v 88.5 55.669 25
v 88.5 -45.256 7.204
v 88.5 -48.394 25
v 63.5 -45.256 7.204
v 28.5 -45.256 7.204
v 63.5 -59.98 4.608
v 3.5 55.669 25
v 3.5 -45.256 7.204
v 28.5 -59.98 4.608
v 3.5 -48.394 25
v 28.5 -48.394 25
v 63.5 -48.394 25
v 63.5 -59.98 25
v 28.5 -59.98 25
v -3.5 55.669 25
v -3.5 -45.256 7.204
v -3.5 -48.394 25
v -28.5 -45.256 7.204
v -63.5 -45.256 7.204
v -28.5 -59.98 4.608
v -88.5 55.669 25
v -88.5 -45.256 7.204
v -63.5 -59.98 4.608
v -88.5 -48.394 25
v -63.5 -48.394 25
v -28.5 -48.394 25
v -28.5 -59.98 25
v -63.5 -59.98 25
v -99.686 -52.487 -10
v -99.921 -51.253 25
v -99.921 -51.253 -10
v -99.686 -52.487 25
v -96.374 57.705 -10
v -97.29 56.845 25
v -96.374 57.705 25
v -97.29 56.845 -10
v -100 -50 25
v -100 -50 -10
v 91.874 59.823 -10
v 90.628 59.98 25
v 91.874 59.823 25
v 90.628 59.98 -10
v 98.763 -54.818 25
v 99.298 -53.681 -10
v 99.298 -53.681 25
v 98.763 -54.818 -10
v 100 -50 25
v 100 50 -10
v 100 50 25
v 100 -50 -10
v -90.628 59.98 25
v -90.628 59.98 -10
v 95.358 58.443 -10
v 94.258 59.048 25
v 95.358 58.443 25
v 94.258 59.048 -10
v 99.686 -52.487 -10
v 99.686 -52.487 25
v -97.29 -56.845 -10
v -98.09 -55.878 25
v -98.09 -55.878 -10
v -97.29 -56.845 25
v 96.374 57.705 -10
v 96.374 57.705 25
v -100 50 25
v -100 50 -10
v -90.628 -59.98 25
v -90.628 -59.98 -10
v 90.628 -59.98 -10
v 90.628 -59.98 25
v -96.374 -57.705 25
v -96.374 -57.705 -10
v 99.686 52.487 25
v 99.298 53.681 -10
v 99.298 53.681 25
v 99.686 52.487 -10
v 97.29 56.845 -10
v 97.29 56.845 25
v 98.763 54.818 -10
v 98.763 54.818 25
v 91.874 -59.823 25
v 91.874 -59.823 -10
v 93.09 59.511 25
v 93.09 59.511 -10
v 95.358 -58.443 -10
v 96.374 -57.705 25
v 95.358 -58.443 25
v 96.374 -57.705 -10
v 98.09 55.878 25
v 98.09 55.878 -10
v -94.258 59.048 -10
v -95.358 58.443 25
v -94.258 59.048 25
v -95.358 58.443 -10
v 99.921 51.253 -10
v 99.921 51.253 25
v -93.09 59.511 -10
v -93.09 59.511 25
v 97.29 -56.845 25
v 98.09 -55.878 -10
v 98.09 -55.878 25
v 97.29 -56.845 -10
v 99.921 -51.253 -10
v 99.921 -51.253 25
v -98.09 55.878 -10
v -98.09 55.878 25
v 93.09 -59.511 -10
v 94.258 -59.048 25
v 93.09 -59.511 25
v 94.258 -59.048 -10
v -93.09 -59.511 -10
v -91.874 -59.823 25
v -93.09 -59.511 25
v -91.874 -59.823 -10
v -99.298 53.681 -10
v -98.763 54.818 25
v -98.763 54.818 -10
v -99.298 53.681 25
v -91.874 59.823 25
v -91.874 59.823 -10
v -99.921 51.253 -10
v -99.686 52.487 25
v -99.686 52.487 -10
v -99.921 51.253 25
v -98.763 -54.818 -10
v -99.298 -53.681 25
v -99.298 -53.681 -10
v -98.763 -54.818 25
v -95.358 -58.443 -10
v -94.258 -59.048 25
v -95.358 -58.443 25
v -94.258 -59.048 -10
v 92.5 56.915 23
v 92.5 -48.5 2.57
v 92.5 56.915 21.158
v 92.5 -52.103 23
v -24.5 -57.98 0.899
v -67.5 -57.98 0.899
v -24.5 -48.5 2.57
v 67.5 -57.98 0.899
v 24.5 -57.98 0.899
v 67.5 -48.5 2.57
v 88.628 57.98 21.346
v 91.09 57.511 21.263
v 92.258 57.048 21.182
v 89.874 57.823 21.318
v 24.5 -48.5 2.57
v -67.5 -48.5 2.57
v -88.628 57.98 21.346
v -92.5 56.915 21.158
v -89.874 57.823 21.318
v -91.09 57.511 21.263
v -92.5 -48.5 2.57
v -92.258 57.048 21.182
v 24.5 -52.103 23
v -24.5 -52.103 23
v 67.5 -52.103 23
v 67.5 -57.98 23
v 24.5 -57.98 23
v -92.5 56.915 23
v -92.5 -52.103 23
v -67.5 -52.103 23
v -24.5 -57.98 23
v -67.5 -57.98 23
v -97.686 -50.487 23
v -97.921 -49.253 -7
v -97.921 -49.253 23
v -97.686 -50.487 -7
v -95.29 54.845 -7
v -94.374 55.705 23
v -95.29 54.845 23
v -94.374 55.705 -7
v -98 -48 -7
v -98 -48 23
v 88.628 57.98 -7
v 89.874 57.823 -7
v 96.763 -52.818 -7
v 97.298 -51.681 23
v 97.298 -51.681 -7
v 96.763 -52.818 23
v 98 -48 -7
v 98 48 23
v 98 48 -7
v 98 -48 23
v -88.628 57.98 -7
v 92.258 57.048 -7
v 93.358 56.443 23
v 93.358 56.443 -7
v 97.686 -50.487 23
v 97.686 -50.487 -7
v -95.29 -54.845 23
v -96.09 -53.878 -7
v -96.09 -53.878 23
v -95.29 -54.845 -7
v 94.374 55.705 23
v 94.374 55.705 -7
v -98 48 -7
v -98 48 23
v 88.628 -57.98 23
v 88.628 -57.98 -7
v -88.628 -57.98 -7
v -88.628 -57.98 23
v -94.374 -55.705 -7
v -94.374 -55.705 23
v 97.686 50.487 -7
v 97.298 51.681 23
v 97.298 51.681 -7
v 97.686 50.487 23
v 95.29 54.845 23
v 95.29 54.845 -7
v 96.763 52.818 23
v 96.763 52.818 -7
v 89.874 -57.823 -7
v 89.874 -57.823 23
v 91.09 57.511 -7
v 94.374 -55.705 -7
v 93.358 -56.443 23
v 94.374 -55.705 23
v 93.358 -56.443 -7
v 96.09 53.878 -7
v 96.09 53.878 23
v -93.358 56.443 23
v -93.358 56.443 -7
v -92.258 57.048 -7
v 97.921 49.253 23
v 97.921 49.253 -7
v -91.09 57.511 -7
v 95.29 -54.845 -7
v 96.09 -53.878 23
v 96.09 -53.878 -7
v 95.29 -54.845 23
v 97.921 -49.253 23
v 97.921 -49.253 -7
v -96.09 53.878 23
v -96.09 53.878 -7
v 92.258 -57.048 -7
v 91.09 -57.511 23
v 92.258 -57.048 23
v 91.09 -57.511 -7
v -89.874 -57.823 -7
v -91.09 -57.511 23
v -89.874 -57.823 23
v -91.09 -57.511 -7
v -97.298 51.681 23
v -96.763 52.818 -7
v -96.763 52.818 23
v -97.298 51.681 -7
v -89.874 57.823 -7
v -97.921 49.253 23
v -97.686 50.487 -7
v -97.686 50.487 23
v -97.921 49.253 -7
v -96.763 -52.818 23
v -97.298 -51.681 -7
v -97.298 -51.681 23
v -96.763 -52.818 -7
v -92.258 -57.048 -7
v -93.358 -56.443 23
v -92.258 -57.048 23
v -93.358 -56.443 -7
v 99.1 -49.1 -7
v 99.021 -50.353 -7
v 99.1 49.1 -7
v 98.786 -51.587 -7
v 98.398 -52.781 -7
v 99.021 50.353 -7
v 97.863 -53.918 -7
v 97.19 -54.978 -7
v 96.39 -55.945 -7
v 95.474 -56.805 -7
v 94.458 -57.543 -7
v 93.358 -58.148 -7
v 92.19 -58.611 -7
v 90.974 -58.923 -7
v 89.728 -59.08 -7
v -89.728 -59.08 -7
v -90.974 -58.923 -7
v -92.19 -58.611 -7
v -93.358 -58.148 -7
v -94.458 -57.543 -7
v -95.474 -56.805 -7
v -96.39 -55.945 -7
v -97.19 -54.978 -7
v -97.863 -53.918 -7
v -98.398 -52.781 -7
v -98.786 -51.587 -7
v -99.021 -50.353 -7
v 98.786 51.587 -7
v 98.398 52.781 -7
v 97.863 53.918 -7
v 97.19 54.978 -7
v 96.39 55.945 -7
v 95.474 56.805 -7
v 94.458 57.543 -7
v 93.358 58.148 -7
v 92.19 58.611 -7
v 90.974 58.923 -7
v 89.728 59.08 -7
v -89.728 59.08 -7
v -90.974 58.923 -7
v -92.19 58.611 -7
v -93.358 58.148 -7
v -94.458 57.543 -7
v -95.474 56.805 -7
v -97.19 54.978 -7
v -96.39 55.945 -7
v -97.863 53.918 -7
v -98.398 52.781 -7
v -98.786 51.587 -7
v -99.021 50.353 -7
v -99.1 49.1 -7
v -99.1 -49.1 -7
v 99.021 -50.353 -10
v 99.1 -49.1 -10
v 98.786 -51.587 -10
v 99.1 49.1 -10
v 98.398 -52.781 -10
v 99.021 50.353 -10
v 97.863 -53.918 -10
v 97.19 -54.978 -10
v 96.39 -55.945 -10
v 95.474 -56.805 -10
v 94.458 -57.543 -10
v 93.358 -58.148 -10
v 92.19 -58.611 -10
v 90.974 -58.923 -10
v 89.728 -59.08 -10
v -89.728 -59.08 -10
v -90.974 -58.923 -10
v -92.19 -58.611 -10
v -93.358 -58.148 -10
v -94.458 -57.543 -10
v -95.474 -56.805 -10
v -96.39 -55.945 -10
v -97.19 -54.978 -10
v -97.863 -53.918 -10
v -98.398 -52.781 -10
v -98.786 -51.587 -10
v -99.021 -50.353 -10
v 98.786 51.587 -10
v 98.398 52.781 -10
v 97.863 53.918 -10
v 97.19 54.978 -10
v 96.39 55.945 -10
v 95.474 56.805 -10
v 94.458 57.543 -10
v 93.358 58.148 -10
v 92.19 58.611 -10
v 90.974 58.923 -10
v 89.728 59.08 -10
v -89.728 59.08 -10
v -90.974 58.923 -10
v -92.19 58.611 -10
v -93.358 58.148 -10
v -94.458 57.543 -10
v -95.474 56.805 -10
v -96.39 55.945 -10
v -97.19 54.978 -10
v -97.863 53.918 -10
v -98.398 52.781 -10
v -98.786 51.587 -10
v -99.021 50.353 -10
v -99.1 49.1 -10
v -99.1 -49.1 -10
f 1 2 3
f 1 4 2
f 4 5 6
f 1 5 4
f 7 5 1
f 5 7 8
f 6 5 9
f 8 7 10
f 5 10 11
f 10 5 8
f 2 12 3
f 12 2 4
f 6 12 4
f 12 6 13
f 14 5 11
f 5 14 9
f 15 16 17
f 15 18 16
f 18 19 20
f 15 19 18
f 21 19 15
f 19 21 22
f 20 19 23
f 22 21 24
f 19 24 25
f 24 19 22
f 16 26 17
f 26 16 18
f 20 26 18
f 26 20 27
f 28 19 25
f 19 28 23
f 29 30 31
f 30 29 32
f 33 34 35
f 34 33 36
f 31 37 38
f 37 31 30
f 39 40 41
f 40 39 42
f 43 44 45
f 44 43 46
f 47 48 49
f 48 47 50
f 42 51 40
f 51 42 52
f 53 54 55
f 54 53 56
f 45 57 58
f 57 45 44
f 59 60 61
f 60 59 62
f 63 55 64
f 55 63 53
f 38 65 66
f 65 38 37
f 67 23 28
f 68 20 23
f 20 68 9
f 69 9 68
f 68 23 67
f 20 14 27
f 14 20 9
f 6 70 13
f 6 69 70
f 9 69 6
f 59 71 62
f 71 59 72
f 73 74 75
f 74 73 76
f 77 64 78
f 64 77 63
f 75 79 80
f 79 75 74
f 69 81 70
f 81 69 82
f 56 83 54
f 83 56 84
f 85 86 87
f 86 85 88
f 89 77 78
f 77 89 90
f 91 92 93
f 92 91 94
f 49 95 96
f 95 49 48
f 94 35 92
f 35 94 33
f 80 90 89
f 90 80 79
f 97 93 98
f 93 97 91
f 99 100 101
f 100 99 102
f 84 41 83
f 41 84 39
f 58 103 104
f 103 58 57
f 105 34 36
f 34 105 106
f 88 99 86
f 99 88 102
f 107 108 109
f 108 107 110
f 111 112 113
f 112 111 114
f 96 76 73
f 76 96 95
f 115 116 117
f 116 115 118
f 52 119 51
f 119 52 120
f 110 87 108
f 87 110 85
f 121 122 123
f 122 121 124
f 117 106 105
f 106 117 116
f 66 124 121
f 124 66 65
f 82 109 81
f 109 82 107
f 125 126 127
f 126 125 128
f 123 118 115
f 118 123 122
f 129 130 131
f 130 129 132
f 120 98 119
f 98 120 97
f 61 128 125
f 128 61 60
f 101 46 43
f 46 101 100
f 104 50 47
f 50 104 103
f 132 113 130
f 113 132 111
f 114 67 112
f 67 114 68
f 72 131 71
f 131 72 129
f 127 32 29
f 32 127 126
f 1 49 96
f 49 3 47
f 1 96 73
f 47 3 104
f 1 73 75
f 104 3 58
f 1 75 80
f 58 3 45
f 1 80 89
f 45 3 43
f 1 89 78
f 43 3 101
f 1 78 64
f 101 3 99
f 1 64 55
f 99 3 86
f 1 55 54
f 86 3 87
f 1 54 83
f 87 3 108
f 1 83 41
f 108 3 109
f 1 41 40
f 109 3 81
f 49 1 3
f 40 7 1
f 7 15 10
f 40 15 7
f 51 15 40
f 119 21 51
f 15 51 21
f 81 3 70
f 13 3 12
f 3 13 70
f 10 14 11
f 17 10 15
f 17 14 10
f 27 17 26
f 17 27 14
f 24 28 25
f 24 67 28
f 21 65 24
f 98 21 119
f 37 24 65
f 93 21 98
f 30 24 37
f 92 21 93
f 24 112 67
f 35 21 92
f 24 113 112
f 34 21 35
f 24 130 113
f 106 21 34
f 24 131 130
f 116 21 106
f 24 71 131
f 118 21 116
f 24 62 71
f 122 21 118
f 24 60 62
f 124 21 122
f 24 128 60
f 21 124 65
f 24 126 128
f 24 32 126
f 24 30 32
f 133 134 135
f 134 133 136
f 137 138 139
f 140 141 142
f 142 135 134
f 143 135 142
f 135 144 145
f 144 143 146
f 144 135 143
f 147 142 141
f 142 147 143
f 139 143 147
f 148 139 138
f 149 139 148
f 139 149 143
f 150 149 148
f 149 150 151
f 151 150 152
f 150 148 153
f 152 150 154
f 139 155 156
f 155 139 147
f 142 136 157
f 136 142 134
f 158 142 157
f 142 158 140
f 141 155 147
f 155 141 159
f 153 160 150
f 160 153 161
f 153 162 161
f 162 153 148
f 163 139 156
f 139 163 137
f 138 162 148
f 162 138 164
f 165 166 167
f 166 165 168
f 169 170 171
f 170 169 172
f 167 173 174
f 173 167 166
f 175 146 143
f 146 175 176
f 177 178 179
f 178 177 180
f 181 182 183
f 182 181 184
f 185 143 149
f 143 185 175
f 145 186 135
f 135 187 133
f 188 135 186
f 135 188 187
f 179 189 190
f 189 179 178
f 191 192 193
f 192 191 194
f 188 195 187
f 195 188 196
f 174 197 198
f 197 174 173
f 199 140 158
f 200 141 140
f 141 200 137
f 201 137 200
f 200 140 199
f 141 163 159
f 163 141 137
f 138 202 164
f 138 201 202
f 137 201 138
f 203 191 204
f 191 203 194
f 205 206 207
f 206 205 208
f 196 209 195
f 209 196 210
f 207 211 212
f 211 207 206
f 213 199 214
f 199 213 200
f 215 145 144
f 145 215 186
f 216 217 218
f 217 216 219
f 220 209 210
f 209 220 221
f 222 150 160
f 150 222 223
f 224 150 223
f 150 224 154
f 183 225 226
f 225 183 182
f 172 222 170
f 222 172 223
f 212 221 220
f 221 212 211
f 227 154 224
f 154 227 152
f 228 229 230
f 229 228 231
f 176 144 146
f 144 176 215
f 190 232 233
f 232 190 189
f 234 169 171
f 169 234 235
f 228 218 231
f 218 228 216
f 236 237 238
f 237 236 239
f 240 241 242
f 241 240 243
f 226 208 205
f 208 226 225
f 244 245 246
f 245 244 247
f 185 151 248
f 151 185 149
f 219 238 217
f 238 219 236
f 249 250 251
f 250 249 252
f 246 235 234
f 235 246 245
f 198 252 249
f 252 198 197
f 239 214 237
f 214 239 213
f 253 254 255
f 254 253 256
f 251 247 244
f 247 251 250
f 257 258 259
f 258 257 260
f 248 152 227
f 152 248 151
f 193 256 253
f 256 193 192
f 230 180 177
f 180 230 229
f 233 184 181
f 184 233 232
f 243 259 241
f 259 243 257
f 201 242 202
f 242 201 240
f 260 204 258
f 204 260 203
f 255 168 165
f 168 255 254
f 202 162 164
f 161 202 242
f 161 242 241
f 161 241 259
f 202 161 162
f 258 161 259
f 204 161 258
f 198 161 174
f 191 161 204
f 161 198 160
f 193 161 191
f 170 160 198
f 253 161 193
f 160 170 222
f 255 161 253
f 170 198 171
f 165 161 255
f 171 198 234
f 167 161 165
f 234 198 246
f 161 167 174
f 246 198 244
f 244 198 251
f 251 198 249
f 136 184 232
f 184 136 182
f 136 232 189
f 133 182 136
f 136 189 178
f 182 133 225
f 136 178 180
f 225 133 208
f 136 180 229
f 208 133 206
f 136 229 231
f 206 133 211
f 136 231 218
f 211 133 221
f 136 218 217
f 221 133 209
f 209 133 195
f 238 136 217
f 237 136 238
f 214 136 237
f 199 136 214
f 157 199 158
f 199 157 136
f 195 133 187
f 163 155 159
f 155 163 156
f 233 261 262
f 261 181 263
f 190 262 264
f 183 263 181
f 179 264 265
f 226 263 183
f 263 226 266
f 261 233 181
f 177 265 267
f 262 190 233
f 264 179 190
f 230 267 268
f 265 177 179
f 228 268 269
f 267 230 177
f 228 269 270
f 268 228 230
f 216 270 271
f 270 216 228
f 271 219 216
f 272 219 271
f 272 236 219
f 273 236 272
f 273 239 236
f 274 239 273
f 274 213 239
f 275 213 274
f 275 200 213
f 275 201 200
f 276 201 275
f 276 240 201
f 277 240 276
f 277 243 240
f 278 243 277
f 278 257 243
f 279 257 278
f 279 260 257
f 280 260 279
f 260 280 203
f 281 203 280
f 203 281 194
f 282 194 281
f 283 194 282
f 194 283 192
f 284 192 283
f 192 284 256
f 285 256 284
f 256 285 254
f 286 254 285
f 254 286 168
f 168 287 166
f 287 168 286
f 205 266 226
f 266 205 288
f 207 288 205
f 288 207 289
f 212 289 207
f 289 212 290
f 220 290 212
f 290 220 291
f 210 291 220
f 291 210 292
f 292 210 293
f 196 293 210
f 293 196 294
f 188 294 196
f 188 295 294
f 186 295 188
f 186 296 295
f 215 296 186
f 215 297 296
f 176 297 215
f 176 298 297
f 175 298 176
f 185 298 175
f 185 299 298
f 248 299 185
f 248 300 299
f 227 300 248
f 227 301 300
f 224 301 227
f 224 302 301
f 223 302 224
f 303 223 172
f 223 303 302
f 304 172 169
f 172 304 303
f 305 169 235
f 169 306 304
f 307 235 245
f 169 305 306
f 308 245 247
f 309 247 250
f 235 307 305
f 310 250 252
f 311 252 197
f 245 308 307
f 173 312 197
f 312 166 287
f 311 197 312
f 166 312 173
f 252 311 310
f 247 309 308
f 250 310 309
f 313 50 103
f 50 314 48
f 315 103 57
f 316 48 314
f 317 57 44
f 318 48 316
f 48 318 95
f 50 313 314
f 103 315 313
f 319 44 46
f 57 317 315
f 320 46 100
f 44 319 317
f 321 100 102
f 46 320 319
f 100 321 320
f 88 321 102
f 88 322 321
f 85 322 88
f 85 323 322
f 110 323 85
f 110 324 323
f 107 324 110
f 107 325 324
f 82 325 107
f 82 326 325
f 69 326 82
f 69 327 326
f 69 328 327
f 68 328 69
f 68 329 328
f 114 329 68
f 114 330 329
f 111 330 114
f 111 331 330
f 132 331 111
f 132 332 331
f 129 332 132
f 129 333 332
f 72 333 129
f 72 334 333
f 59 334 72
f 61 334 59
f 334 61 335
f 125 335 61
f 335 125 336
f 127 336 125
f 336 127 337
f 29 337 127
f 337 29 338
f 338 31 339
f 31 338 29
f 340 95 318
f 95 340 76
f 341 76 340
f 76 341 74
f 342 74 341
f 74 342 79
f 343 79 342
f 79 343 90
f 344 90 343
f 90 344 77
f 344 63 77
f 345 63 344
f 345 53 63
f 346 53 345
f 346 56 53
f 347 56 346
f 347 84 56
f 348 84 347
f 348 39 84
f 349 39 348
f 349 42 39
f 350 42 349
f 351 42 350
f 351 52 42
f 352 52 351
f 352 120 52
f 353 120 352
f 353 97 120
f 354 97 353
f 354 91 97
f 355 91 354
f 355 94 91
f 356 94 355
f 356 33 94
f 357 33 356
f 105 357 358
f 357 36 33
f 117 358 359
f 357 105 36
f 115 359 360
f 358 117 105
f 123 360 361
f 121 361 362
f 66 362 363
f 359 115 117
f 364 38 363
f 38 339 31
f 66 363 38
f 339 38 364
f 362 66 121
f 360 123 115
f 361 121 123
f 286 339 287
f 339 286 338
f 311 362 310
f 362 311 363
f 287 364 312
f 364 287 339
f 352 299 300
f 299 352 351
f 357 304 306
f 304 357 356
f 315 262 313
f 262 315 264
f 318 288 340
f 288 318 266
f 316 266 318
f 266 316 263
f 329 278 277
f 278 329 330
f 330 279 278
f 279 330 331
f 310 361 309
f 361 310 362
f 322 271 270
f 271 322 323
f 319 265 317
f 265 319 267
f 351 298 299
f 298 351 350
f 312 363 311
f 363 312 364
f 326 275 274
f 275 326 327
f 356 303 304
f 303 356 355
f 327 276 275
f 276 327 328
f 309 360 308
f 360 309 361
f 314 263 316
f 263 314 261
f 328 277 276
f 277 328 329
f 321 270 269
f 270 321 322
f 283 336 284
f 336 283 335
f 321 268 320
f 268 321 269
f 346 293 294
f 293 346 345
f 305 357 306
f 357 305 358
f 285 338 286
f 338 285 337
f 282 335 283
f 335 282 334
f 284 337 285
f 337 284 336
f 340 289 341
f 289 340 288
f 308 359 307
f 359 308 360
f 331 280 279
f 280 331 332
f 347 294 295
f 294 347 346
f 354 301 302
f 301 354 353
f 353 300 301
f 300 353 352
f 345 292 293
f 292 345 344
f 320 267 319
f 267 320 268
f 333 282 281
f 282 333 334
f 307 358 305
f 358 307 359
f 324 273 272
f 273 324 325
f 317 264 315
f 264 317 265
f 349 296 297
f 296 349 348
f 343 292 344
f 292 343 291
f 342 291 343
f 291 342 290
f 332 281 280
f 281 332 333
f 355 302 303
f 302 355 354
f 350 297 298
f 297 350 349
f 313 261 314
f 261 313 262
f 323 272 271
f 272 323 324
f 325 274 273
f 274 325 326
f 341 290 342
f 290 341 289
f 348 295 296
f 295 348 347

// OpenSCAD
// file: charger_station.scad
/**
  * Charger station for two phones.
  *
  * @author Max Starikov
  * @license MIT




todo:
- make the upeer part tilted
- add crew connections

  */

$fn = 50;

box_width = 200;
box_length = 120;
box_height = 50;
split_level = -10;
corner_radius = 10;
wall_thickness = 2;
joint_height = 3;
joint_clearance = 0.1;
foot_width = 10;
foot_length = 10;
foot_radius = 2;
foot_recess_depth = 0.5;
foot_edge_distance = 10;
power_hole_diameter = 7;
boolean_overlap = 0.1;

module rounded_rectangle(width, length, radius) {
  hull() {
    for (x = [-width / 2 + radius, width / 2 - radius])
      for (y = [-length / 2 + radius, length / 2 - radius])
        translate([x, y]) circle(r=radius);
  }
}

module outer_outline(offset = 0, side_clearance = 0) {
  linear_extrude(height=box_height - offset, center=true)
    rounded_rectangle(
      box_width - offset + 2 * side_clearance,
      box_length - offset + 2 * side_clearance,
      corner_radius
    );
}

module foot_recesses() {
  for (x = [-1, 1])
    for (y = [-1, 1])
      translate(
        [
          x * (box_width / 2 - foot_edge_distance - foot_width / 2),
          y * (box_length / 2 - foot_edge_distance - foot_length / 2),
          -box_height / 2 - boolean_overlap,
        ]
      )
        linear_extrude(height=foot_recess_depth + boolean_overlap)
          rounded_rectangle(foot_width, foot_length, foot_radius);
}

module power_connector_hole() {
  translate([
    box_width / 2 - wall_thickness / 2,
    40,
    (-box_height / 2 + split_level) / 2
  ])
    rotate([0, 90, 0])
      cylinder(
        d=power_hole_diameter,
        h=wall_thickness + 2 * boolean_overlap,
        center=true
      );
}

module outer_outline_with_phones(wall_thickness = 0) {
  difference() {
    outer_outline(wall_thickness);
    phone_outlines(-wall_thickness);
  }
}


module upper_part() {

          //phone_outlines();


  difference() {

    outer_outline_with_phones();
    
    translate([-box_width, -box_length, split_level + joint_height - box_height])
      cube([2 * box_width, 2 * box_length, box_height]);
    outer_outline_with_phones(wall_thickness * 2);

  }

  difference() {
    outer_outline_with_phones();
    translate([-box_width, -box_length, split_level - box_height])
      cube([2 * box_width, 2 * box_length, box_height]);
    outer_outline(wall_thickness, joint_clearance);
  }
}

module bottom_part() {
  difference() {
    outer_outline();
    translate([-box_width, -box_length, split_level])
      cube([2 * box_width, 2 * box_length, box_height]);
    outer_outline(wall_thickness * 2);
    foot_recesses();
    power_connector_hole();
  }

  difference() {
    outer_outline(wall_thickness);
    translate([-box_width, -box_length, split_level + joint_height])
      cube([2 * box_width, 2 * box_length, box_height]);
    outer_outline(wall_thickness * 2);
    power_connector_hole();
  }
}

module phone_outlines(wall_thickness = 0) {
  translate([46, 26, 35])
    rotate([10, 0, 0])
      phone_outline(wall_thickness);

  translate([-46, 26, 35])
    rotate([10, 0, 0])
      phone_outline(wall_thickness);
}

module phone_outline(wall_thickness = 0) {
  cube([85 - 2 * wall_thickness, 150- 2 * wall_thickness, 30- 2 * wall_thickness], center=true);

  cube([35- 2 * wall_thickness, 200- 2 * wall_thickness, 30- 2 * wall_thickness ], center=true);
}

translate([0, 0, 30])
  upper_part();
bottom_part();
// main file
use <charger_station.scad>

//rotate([0, 180, 0]) {
    upper_part();
//}
